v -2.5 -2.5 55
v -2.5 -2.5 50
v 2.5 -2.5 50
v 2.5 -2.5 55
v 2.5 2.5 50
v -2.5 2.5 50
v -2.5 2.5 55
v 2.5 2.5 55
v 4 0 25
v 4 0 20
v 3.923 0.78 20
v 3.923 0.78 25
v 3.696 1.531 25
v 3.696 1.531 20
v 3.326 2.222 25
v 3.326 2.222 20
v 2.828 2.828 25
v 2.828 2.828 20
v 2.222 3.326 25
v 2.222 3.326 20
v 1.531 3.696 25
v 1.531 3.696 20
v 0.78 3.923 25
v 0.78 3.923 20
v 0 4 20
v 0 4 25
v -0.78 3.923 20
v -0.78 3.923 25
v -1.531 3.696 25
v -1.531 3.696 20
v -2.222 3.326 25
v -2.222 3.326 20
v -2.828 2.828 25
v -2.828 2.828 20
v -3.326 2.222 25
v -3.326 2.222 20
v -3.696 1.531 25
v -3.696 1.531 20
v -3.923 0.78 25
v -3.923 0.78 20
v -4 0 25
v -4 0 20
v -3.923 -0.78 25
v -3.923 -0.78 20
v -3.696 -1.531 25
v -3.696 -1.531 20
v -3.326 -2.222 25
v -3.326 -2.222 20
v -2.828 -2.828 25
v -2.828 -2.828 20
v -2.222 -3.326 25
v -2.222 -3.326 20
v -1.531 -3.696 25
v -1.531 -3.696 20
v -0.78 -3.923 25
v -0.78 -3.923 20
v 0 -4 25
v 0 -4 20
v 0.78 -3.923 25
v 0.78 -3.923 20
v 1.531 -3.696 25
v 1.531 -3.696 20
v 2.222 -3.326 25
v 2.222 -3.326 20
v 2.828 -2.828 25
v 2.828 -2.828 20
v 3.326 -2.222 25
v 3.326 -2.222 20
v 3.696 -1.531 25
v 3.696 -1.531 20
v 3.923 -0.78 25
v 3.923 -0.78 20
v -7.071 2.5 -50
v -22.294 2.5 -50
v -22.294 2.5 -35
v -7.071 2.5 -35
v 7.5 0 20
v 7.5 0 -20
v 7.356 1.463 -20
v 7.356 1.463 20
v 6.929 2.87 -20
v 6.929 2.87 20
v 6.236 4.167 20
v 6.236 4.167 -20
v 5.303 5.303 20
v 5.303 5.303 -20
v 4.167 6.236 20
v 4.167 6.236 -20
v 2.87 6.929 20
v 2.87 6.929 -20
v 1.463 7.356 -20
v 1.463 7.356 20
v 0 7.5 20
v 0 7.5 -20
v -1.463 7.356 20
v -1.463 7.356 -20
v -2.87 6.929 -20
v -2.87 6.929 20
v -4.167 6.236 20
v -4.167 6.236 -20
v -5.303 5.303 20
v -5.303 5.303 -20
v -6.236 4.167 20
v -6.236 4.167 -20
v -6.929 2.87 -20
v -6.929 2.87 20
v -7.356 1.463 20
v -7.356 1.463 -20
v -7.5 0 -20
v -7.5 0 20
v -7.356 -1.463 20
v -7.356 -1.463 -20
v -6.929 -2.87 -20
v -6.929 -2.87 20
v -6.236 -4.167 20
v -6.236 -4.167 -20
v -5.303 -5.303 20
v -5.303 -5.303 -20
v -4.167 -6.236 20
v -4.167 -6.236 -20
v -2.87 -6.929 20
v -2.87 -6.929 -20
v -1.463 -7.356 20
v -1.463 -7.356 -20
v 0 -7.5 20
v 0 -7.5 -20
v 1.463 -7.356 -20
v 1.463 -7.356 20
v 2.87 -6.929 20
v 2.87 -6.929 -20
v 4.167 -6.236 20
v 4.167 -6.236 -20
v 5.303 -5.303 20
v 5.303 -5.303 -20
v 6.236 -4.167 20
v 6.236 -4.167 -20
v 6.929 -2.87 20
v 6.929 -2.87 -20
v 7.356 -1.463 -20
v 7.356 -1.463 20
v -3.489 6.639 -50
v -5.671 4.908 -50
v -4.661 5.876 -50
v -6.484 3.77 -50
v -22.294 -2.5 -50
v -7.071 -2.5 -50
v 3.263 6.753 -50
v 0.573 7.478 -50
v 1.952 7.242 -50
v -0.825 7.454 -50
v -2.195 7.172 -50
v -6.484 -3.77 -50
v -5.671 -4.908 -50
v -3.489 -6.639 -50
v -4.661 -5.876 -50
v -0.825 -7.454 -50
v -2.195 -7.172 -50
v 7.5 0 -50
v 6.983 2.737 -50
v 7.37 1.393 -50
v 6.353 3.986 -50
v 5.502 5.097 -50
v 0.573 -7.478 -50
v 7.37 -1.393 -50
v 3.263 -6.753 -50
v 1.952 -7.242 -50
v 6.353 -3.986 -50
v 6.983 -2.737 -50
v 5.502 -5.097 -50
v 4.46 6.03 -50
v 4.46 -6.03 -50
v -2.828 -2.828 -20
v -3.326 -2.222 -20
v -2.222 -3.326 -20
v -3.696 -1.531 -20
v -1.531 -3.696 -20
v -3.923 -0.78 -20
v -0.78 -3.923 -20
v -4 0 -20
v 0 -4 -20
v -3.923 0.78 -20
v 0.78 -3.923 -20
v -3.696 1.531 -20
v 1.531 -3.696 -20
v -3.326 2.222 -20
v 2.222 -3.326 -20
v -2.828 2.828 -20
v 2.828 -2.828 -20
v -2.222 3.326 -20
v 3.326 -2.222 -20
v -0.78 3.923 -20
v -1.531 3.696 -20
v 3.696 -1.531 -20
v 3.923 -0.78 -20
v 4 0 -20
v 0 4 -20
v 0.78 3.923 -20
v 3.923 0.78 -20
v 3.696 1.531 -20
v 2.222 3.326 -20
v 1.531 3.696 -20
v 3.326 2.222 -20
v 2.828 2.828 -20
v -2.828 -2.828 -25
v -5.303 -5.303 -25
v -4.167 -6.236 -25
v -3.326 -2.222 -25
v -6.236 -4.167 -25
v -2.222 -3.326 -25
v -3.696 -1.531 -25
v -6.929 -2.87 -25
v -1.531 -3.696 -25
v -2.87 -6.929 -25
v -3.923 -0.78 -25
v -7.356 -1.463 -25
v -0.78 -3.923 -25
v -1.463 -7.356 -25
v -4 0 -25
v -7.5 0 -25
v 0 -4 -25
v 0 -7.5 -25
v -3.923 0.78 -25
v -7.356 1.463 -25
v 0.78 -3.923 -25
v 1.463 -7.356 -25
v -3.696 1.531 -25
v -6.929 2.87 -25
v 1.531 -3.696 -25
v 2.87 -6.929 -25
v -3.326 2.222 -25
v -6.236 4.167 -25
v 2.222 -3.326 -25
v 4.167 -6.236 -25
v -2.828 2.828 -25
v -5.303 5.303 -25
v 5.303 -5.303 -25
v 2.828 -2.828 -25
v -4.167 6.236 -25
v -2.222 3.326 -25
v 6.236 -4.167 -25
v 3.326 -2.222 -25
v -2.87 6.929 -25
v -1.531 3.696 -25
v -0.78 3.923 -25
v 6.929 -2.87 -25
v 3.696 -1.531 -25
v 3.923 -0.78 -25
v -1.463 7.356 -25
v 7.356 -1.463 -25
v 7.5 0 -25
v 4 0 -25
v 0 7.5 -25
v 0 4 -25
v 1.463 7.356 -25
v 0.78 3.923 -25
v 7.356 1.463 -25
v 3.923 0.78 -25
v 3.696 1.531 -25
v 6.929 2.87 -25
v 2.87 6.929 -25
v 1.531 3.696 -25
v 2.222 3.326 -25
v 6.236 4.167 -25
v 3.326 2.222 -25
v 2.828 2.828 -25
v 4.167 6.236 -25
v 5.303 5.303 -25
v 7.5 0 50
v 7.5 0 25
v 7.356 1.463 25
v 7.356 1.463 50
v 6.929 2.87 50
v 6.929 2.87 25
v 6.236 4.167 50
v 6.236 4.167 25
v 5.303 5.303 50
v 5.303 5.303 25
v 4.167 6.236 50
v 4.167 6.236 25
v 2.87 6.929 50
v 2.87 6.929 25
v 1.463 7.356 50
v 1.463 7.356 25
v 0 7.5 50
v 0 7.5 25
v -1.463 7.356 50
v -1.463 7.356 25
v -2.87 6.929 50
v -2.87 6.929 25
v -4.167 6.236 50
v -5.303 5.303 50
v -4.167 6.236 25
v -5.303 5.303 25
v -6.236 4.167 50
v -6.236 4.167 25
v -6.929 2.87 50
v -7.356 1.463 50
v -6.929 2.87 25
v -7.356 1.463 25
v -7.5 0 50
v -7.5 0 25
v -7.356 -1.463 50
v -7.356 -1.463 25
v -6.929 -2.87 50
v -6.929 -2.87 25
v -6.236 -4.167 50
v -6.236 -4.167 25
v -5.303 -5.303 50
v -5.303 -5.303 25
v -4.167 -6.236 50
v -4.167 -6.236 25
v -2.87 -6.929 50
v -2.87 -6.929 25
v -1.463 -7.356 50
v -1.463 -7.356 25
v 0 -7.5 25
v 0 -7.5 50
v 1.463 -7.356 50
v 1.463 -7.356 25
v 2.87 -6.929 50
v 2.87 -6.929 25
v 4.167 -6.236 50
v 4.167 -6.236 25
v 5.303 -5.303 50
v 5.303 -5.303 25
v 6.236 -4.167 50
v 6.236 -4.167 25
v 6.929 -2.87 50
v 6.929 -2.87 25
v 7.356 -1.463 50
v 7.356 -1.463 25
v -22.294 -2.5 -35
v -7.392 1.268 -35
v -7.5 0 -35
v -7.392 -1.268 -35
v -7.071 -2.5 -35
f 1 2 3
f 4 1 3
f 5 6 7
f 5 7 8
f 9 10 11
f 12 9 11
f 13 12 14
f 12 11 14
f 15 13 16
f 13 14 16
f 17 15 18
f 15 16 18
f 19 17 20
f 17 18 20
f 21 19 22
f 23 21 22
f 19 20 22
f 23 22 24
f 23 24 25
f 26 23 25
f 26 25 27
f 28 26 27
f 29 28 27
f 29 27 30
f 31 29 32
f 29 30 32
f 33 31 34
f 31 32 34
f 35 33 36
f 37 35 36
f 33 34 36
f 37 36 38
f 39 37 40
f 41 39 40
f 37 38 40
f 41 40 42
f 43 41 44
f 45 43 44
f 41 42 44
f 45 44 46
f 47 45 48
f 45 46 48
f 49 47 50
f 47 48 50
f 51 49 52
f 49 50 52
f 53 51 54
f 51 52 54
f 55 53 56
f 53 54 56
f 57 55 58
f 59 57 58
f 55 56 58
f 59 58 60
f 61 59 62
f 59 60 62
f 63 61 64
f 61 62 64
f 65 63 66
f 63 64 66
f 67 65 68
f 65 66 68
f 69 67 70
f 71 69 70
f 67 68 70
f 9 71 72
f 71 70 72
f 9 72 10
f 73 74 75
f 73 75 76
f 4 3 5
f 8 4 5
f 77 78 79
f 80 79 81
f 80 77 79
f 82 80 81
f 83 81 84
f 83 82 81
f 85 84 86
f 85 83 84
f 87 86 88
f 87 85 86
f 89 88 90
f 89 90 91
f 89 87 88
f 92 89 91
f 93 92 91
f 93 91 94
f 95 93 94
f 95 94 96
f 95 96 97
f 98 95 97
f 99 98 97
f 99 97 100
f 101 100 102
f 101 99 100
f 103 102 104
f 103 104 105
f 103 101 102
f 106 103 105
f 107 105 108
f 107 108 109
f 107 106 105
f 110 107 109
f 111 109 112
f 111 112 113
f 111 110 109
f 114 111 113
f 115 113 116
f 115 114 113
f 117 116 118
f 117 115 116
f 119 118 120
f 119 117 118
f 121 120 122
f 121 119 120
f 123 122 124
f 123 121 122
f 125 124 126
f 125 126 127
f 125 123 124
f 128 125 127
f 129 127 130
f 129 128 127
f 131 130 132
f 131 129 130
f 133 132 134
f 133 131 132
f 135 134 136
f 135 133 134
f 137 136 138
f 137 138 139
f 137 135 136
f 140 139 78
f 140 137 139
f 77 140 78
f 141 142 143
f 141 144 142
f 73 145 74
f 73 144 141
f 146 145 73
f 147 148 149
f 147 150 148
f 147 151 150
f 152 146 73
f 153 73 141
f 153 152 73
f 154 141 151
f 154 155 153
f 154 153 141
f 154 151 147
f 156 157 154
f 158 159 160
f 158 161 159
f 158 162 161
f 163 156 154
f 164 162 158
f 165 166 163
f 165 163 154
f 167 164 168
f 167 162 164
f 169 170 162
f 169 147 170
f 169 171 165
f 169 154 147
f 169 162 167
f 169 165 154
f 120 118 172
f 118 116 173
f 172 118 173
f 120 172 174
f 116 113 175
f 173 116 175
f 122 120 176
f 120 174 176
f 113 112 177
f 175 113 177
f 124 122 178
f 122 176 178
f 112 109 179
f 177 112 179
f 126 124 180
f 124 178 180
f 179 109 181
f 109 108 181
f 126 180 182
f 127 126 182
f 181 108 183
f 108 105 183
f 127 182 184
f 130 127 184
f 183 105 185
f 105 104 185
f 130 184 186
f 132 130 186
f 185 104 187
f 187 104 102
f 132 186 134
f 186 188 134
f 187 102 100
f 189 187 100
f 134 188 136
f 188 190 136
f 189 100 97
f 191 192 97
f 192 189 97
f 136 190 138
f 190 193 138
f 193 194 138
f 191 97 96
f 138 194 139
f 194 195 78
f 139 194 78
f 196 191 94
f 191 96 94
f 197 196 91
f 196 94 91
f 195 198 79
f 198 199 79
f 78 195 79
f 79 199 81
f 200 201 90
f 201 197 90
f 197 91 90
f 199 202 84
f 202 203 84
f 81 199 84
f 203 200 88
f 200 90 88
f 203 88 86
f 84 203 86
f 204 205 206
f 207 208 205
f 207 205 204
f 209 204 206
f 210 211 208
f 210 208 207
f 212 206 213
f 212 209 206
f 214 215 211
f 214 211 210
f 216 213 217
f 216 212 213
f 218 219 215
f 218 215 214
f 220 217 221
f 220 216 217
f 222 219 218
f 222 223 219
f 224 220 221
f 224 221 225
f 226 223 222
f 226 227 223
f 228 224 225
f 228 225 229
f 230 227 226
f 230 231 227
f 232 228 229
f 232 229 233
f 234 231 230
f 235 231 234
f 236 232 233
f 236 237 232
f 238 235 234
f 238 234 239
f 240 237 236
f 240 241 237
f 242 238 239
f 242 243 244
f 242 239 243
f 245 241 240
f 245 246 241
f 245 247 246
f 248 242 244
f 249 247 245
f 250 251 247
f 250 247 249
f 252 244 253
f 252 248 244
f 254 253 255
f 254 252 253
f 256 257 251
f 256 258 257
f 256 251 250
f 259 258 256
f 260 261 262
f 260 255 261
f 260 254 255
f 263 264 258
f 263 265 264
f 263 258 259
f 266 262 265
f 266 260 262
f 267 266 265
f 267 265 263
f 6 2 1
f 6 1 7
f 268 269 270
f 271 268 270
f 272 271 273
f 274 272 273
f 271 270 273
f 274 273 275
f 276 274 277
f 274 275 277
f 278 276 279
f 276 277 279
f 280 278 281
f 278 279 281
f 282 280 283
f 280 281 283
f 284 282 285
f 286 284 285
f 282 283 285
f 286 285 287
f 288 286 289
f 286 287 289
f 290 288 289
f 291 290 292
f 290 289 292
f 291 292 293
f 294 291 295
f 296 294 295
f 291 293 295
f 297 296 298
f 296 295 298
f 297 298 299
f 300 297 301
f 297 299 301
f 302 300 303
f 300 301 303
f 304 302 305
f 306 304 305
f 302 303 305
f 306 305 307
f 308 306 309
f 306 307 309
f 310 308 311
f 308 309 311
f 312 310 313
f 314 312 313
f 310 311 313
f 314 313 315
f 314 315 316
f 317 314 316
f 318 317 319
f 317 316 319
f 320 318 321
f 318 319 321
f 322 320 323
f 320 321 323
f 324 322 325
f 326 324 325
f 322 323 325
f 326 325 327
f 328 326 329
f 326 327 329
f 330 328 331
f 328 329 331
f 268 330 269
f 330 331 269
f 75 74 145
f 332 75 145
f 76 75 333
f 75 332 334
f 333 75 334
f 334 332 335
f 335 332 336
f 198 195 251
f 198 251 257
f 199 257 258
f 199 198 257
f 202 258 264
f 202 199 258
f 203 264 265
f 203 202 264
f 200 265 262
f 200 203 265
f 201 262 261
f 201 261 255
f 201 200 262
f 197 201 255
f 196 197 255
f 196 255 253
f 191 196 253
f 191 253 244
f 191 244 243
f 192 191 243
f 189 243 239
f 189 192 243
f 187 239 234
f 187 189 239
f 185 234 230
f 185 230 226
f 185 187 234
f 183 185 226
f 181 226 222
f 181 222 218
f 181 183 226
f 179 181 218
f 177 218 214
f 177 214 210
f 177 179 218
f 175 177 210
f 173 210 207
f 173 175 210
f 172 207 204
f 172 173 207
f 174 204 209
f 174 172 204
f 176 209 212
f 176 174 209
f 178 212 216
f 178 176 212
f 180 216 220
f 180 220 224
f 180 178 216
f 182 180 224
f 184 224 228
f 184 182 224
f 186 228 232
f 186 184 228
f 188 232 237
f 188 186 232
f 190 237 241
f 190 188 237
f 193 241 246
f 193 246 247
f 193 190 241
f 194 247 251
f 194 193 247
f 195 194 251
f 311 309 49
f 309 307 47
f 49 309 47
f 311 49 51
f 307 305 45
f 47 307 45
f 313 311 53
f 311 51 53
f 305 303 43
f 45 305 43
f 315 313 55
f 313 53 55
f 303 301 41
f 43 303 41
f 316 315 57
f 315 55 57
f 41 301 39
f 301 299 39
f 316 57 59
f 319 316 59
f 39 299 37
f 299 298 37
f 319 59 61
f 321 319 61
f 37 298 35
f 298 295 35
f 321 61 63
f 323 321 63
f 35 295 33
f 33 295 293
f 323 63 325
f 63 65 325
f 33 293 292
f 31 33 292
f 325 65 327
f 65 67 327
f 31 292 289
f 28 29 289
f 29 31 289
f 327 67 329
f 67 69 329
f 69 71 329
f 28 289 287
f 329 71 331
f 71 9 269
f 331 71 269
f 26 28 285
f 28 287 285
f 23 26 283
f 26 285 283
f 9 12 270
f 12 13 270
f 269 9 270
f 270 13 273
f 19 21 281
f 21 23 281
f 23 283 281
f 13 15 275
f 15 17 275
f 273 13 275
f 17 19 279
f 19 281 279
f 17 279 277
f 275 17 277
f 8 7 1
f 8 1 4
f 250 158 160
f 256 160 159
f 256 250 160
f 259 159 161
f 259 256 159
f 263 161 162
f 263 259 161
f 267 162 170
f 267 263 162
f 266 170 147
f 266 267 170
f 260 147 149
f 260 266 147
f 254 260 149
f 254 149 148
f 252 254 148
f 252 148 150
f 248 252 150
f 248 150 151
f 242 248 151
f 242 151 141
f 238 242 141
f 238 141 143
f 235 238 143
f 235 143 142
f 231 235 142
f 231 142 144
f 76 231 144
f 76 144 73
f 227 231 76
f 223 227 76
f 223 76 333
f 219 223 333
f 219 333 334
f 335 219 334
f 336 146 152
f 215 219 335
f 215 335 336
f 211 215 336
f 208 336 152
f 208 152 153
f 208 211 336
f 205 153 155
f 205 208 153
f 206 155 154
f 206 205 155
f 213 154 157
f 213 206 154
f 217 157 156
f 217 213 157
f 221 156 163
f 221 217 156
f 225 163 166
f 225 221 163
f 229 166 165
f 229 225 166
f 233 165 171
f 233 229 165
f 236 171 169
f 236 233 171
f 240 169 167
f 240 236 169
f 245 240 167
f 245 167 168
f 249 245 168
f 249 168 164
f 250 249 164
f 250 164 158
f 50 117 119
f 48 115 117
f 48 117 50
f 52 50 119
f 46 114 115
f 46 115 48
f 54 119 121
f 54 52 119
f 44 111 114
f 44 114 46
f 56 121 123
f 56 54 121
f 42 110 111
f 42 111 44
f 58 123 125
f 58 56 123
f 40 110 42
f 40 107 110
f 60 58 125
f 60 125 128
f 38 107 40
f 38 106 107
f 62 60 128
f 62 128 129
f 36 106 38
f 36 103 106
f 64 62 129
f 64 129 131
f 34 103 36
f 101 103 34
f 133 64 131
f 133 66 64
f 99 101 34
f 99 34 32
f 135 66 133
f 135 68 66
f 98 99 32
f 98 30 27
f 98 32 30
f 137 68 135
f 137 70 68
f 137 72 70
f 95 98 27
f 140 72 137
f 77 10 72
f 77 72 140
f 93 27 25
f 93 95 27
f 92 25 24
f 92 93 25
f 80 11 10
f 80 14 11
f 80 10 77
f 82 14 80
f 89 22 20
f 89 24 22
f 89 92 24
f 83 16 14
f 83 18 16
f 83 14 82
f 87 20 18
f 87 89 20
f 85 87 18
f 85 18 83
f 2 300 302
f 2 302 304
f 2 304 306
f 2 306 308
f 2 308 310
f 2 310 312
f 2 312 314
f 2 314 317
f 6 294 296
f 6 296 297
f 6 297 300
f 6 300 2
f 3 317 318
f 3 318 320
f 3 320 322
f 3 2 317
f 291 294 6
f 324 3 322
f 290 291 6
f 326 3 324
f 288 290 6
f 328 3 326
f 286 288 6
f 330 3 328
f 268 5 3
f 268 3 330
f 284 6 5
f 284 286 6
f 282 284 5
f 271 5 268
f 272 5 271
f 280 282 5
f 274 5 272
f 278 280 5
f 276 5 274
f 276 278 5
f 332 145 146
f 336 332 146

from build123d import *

# Parameters (mm, degrees)
F0_R      = 7.5
F1_DEPTH  = 20
F2_R      = 4
F3_DEPTH  = 5
F4_R      = 7.5
F4_R_2    = 4
F5_DEPTH  = 25
F7_W      = 5
F7_H      = 5
F8_DEPTH  = 5
F9_W      = 24.7944914738
F9_H      = 5
F10_DEPTH = 15


with BuildPart() as f1:
    # F0 (on Top) → F1 (new body)
    with BuildSketch(Plane.XY):
        Circle(F0_R)
    extrude(amount=F1_DEPTH)

    # F2 (on face) → F3 (join)
    with BuildSketch(Plane.XY.offset(20)):
        Circle(F2_R)
    extrude(amount=F3_DEPTH)

    # F4 (on face) → F5 (join)
    with BuildSketch(Plane.XY.offset(25)):
        Circle(F4_R)
        Circle(F4_R_2, mode=Mode.SUBTRACT)
        Circle(F4_R_2)
    extrude(amount=F5_DEPTH)

    # F6: F1 across plane


with BuildPart() as f1_1:
    add(f1.part)
    add(f1.part.mirror(Plane.XY))

    # F7 (on face) → F8 (join)
    with BuildSketch(Plane.XY.offset(50)):
        Rectangle(F7_W, F7_H)
    extrude(amount=F8_DEPTH)

    # F9 (on face) → F10 (join)
    with BuildSketch(Plane(origin=(0, 0, -50), x_dir=(1, 0, 0), z_dir=(0, 0, -1))):
        with Locations((-9.8972457369, 0)):
            Rectangle(F9_W, F9_H)
    extrude(amount=-F10_DEPTH)


solid = f1_1.part
